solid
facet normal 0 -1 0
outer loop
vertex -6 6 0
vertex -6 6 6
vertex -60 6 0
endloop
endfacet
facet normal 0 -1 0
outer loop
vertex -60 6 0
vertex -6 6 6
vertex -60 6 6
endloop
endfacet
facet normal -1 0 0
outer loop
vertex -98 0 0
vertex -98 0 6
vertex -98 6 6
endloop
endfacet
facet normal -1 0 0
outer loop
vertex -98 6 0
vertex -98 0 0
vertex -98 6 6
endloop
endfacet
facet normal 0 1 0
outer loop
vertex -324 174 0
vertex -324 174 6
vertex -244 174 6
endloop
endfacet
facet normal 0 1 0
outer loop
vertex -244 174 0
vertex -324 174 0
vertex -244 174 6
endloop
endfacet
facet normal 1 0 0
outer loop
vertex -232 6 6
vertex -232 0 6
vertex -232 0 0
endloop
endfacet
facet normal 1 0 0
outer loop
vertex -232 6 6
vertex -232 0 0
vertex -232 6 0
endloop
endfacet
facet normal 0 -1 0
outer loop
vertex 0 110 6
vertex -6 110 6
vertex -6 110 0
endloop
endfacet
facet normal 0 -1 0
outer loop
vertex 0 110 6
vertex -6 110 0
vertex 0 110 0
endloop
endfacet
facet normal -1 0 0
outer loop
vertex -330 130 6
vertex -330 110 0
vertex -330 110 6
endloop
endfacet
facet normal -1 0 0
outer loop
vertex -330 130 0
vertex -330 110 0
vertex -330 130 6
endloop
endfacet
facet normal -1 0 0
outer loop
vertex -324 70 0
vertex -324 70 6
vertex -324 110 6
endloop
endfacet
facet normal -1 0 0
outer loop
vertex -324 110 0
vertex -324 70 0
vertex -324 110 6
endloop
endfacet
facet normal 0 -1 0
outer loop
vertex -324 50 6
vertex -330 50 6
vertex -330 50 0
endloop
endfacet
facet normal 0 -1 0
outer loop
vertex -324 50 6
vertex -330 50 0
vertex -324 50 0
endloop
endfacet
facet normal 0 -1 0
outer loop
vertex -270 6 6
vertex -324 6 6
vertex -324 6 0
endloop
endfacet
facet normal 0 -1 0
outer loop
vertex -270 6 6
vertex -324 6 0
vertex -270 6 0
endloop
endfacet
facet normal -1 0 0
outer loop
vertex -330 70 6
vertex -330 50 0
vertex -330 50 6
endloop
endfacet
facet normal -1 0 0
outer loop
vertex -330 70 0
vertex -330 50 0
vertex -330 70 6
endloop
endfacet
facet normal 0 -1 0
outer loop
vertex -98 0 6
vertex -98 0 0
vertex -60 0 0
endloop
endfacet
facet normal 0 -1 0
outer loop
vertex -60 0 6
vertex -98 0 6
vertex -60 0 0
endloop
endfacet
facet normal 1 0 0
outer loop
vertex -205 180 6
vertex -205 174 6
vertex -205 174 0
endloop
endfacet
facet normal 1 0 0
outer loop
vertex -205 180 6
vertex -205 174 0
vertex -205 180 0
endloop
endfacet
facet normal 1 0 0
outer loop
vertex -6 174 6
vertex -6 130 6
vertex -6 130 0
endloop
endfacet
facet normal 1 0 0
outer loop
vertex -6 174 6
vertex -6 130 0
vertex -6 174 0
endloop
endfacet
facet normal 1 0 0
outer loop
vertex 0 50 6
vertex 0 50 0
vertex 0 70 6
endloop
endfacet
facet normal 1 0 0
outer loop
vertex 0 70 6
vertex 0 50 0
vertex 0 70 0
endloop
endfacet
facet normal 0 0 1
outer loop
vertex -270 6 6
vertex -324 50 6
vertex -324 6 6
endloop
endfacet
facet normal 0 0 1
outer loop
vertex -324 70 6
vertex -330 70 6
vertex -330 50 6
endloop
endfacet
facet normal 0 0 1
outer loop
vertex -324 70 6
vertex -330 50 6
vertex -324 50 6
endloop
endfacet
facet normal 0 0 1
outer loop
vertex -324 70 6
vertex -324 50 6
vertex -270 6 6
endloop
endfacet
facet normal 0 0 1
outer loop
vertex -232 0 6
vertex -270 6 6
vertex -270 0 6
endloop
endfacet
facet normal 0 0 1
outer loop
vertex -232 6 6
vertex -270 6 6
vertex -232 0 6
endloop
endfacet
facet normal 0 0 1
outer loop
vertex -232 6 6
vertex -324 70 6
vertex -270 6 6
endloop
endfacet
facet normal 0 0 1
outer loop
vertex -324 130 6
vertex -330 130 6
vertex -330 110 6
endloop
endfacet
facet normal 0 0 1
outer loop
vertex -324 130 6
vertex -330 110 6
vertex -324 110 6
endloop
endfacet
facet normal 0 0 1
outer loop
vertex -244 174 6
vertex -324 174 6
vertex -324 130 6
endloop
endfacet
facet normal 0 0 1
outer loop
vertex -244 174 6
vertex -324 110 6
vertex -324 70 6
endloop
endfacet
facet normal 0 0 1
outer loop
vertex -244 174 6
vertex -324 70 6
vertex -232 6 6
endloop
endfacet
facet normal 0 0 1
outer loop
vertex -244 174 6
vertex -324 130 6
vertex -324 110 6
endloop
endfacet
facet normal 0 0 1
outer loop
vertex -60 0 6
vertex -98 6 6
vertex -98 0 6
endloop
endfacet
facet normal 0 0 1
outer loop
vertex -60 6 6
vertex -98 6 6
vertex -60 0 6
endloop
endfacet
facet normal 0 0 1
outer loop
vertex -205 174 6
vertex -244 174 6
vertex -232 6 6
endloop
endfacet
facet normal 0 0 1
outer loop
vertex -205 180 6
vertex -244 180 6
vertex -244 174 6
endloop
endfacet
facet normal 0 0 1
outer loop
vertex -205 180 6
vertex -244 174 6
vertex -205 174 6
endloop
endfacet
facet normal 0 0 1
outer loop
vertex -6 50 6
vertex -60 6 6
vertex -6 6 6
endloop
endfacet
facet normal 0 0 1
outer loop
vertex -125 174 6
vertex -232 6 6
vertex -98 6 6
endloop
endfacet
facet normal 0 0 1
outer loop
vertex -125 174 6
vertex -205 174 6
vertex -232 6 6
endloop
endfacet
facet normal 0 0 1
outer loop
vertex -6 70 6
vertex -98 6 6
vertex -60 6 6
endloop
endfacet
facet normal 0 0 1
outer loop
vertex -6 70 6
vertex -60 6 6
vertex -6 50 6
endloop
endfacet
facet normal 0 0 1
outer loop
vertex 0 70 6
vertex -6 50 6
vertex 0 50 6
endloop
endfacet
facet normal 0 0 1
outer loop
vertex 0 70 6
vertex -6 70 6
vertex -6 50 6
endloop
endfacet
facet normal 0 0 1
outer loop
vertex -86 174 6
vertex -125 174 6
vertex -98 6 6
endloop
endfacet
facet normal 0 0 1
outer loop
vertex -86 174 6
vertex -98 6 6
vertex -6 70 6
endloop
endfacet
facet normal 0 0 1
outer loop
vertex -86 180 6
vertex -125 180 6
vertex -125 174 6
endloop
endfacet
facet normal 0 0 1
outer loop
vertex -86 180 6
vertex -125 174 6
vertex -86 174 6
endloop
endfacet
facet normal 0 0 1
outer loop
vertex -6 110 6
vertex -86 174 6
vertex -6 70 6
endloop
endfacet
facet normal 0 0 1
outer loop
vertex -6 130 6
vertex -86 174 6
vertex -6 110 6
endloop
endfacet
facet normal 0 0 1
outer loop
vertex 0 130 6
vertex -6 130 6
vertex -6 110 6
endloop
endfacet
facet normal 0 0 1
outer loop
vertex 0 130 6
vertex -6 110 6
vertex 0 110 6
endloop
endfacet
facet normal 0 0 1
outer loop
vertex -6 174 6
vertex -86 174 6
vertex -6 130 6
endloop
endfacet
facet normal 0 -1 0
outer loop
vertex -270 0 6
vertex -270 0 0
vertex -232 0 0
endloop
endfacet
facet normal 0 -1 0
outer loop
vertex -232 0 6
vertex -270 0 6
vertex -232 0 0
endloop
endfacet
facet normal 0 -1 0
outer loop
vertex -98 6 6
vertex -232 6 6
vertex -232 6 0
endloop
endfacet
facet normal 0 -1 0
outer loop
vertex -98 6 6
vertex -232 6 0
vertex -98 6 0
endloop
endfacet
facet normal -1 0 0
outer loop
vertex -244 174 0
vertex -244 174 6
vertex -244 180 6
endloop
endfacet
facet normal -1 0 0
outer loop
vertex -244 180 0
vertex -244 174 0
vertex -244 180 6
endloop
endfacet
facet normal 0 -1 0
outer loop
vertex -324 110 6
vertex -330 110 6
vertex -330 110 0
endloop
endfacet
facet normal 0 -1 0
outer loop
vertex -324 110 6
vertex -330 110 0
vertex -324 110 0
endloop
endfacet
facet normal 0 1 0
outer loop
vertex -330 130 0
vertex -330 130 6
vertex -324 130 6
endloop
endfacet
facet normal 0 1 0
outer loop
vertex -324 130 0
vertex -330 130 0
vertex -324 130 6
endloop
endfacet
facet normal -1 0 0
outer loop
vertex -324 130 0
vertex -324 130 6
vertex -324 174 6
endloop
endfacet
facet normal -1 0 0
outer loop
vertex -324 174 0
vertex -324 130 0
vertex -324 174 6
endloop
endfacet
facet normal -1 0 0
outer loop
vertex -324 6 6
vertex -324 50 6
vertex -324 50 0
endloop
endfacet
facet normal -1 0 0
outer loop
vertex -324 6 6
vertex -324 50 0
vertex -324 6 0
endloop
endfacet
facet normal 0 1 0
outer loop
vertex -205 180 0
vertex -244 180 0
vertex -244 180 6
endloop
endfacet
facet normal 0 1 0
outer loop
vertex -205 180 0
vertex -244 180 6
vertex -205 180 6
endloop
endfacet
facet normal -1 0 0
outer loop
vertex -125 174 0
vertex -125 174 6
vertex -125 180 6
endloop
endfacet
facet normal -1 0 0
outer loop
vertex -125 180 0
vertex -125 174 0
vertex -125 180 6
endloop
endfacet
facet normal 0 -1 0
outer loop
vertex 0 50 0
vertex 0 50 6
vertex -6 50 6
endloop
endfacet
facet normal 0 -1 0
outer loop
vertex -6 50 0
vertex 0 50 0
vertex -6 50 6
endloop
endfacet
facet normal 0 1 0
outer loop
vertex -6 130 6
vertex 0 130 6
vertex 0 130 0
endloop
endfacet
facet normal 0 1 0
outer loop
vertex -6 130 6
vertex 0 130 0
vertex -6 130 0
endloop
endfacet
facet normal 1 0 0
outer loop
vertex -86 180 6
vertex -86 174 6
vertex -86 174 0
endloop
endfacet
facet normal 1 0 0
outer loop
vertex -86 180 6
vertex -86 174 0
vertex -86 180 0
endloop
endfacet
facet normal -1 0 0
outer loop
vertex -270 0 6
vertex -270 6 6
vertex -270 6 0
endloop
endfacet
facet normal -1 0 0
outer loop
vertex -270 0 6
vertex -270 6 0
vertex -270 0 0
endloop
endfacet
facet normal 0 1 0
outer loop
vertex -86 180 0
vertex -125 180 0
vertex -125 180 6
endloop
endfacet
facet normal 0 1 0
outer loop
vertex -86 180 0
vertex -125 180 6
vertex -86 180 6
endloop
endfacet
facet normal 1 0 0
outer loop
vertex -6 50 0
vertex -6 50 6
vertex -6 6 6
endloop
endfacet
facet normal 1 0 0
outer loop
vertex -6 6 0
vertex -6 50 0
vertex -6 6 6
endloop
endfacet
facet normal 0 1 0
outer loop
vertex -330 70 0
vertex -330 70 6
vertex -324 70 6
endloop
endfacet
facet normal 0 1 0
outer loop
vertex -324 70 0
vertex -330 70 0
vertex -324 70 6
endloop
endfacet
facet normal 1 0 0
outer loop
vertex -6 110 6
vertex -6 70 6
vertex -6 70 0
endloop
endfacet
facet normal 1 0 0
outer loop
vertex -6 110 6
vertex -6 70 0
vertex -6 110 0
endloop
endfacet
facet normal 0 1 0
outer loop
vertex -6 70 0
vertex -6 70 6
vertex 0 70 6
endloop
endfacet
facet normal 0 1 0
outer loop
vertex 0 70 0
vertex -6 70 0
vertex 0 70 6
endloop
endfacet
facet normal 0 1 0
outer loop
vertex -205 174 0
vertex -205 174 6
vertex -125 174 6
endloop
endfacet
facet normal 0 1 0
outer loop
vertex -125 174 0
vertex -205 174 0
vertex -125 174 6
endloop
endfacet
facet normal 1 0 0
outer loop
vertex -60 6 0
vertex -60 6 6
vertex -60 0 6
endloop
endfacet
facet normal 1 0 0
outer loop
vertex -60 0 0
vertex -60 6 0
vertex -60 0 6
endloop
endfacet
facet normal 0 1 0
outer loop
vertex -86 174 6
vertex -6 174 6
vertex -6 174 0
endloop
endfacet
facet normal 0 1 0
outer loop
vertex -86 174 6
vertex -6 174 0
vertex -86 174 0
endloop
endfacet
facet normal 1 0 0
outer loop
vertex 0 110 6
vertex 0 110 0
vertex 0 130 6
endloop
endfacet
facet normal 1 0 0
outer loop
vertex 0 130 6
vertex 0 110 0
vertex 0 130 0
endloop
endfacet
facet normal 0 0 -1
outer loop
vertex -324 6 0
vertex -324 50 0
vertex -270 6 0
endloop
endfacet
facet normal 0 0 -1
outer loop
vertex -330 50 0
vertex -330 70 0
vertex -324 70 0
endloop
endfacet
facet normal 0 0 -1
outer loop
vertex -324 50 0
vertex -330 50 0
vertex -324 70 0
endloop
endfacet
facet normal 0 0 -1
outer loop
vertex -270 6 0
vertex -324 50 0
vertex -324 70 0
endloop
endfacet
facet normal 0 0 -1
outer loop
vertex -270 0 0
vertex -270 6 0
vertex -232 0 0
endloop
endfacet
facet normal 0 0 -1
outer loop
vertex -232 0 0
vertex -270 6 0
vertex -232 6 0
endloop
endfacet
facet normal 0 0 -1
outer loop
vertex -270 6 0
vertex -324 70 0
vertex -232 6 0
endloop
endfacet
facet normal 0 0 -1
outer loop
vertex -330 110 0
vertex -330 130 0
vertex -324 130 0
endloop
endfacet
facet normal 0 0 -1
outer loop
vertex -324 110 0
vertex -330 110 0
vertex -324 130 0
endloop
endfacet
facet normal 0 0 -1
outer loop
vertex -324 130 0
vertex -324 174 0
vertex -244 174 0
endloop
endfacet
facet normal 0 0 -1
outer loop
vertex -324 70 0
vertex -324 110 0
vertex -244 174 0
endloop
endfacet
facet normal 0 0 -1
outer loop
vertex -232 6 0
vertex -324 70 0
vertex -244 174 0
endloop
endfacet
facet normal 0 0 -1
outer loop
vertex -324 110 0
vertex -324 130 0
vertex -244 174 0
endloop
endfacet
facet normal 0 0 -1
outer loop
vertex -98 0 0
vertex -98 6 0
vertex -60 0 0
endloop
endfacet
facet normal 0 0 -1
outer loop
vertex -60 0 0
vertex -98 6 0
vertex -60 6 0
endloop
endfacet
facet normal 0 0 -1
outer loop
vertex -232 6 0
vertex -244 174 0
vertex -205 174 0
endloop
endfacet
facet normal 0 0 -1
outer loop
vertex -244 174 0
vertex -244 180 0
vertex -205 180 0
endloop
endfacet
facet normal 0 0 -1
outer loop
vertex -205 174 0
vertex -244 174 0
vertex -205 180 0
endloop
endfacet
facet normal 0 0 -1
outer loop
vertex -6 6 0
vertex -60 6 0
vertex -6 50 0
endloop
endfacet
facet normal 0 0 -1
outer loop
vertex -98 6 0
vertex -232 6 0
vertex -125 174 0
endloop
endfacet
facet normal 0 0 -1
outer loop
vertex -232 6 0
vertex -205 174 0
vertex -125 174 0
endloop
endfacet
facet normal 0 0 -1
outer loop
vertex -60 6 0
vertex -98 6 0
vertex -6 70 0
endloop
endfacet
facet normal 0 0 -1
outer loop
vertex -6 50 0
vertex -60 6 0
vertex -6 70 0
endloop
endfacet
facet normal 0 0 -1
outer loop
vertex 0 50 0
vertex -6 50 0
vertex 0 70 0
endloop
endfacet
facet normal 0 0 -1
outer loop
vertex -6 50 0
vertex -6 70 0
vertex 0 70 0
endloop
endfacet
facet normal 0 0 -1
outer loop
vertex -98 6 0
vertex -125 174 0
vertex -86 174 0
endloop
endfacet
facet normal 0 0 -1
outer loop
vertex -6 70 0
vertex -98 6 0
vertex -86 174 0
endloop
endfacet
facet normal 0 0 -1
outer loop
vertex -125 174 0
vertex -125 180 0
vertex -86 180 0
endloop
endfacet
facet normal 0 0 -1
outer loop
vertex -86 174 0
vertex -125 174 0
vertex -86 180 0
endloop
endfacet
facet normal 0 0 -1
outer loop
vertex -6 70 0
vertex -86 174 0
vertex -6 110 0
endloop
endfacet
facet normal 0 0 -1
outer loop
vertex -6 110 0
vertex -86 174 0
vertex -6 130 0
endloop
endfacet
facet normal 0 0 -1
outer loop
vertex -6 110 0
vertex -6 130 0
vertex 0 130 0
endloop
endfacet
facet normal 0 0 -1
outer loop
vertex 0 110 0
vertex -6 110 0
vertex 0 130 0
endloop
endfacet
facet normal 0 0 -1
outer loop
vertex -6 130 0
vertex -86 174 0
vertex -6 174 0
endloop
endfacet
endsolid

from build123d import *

# Parameters (mm, degrees)
ESQUISSE1_W             = 330
ESQUISSE1_H             = 180
BOSS_EXTRU_1_DEPTH      = 6
ESQUISSE2_W             = 6
ESQUISSE2_H             = 40
ESQUISSE2_W_2           = 80
ESQUISSE2_H_2           = 6
ESQUISSE2_W_3           = 134
ENL_V_MAT_EXTRU_1_DEPTH = 376.946804748


with BuildPart() as part:
    # Esquisse1 → Boss.-Extru.1 (new body)
    with BuildSketch(Plane.XY):
        with Locations((-165, 90)):
            Rectangle(ESQUISSE1_W, ESQUISSE1_H)
    extrude(amount=BOSS_EXTRU_1_DEPTH)

    # Esquisse2 → Enlèv. mat.-Extru.1 (cut, through all)
    with BuildSketch(Plane.XY.offset(6)):
        Polygon((-330, 180), (-330, 130), (-324, 130), (-324, 174), (-244, 174), (-244, 180), align=None)
        Polygon((-330, 0), (-330, 50), (-324, 50), (-324, 6), (-270, 6), (-270, 0), align=None)
        with Locations((-327, 90)):
            Rectangle(ESQUISSE2_W, ESQUISSE2_H)
        Polygon((0, 180), (0, 130), (-6, 130), (-6, 174), (-86, 174), (-86, 180), align=None)
        Polygon((0, 0), (0, 50), (-6, 50), (-6, 6), (-60, 6), (-60, 0), align=None)
        with Locations((-3, 90)):
            Rectangle(ESQUISSE2_W, ESQUISSE2_H)
        with Locations((-165, 177)):
            Rectangle(ESQUISSE2_W_2, ESQUISSE2_H_2)
        with Locations((-165, 3)):
            Rectangle(ESQUISSE2_W_3, ESQUISSE2_H_2)
    extrude(amount=-ENL_V_MAT_EXTRU_1_DEPTH, mode=Mode.SUBTRACT)


solid = part.part
